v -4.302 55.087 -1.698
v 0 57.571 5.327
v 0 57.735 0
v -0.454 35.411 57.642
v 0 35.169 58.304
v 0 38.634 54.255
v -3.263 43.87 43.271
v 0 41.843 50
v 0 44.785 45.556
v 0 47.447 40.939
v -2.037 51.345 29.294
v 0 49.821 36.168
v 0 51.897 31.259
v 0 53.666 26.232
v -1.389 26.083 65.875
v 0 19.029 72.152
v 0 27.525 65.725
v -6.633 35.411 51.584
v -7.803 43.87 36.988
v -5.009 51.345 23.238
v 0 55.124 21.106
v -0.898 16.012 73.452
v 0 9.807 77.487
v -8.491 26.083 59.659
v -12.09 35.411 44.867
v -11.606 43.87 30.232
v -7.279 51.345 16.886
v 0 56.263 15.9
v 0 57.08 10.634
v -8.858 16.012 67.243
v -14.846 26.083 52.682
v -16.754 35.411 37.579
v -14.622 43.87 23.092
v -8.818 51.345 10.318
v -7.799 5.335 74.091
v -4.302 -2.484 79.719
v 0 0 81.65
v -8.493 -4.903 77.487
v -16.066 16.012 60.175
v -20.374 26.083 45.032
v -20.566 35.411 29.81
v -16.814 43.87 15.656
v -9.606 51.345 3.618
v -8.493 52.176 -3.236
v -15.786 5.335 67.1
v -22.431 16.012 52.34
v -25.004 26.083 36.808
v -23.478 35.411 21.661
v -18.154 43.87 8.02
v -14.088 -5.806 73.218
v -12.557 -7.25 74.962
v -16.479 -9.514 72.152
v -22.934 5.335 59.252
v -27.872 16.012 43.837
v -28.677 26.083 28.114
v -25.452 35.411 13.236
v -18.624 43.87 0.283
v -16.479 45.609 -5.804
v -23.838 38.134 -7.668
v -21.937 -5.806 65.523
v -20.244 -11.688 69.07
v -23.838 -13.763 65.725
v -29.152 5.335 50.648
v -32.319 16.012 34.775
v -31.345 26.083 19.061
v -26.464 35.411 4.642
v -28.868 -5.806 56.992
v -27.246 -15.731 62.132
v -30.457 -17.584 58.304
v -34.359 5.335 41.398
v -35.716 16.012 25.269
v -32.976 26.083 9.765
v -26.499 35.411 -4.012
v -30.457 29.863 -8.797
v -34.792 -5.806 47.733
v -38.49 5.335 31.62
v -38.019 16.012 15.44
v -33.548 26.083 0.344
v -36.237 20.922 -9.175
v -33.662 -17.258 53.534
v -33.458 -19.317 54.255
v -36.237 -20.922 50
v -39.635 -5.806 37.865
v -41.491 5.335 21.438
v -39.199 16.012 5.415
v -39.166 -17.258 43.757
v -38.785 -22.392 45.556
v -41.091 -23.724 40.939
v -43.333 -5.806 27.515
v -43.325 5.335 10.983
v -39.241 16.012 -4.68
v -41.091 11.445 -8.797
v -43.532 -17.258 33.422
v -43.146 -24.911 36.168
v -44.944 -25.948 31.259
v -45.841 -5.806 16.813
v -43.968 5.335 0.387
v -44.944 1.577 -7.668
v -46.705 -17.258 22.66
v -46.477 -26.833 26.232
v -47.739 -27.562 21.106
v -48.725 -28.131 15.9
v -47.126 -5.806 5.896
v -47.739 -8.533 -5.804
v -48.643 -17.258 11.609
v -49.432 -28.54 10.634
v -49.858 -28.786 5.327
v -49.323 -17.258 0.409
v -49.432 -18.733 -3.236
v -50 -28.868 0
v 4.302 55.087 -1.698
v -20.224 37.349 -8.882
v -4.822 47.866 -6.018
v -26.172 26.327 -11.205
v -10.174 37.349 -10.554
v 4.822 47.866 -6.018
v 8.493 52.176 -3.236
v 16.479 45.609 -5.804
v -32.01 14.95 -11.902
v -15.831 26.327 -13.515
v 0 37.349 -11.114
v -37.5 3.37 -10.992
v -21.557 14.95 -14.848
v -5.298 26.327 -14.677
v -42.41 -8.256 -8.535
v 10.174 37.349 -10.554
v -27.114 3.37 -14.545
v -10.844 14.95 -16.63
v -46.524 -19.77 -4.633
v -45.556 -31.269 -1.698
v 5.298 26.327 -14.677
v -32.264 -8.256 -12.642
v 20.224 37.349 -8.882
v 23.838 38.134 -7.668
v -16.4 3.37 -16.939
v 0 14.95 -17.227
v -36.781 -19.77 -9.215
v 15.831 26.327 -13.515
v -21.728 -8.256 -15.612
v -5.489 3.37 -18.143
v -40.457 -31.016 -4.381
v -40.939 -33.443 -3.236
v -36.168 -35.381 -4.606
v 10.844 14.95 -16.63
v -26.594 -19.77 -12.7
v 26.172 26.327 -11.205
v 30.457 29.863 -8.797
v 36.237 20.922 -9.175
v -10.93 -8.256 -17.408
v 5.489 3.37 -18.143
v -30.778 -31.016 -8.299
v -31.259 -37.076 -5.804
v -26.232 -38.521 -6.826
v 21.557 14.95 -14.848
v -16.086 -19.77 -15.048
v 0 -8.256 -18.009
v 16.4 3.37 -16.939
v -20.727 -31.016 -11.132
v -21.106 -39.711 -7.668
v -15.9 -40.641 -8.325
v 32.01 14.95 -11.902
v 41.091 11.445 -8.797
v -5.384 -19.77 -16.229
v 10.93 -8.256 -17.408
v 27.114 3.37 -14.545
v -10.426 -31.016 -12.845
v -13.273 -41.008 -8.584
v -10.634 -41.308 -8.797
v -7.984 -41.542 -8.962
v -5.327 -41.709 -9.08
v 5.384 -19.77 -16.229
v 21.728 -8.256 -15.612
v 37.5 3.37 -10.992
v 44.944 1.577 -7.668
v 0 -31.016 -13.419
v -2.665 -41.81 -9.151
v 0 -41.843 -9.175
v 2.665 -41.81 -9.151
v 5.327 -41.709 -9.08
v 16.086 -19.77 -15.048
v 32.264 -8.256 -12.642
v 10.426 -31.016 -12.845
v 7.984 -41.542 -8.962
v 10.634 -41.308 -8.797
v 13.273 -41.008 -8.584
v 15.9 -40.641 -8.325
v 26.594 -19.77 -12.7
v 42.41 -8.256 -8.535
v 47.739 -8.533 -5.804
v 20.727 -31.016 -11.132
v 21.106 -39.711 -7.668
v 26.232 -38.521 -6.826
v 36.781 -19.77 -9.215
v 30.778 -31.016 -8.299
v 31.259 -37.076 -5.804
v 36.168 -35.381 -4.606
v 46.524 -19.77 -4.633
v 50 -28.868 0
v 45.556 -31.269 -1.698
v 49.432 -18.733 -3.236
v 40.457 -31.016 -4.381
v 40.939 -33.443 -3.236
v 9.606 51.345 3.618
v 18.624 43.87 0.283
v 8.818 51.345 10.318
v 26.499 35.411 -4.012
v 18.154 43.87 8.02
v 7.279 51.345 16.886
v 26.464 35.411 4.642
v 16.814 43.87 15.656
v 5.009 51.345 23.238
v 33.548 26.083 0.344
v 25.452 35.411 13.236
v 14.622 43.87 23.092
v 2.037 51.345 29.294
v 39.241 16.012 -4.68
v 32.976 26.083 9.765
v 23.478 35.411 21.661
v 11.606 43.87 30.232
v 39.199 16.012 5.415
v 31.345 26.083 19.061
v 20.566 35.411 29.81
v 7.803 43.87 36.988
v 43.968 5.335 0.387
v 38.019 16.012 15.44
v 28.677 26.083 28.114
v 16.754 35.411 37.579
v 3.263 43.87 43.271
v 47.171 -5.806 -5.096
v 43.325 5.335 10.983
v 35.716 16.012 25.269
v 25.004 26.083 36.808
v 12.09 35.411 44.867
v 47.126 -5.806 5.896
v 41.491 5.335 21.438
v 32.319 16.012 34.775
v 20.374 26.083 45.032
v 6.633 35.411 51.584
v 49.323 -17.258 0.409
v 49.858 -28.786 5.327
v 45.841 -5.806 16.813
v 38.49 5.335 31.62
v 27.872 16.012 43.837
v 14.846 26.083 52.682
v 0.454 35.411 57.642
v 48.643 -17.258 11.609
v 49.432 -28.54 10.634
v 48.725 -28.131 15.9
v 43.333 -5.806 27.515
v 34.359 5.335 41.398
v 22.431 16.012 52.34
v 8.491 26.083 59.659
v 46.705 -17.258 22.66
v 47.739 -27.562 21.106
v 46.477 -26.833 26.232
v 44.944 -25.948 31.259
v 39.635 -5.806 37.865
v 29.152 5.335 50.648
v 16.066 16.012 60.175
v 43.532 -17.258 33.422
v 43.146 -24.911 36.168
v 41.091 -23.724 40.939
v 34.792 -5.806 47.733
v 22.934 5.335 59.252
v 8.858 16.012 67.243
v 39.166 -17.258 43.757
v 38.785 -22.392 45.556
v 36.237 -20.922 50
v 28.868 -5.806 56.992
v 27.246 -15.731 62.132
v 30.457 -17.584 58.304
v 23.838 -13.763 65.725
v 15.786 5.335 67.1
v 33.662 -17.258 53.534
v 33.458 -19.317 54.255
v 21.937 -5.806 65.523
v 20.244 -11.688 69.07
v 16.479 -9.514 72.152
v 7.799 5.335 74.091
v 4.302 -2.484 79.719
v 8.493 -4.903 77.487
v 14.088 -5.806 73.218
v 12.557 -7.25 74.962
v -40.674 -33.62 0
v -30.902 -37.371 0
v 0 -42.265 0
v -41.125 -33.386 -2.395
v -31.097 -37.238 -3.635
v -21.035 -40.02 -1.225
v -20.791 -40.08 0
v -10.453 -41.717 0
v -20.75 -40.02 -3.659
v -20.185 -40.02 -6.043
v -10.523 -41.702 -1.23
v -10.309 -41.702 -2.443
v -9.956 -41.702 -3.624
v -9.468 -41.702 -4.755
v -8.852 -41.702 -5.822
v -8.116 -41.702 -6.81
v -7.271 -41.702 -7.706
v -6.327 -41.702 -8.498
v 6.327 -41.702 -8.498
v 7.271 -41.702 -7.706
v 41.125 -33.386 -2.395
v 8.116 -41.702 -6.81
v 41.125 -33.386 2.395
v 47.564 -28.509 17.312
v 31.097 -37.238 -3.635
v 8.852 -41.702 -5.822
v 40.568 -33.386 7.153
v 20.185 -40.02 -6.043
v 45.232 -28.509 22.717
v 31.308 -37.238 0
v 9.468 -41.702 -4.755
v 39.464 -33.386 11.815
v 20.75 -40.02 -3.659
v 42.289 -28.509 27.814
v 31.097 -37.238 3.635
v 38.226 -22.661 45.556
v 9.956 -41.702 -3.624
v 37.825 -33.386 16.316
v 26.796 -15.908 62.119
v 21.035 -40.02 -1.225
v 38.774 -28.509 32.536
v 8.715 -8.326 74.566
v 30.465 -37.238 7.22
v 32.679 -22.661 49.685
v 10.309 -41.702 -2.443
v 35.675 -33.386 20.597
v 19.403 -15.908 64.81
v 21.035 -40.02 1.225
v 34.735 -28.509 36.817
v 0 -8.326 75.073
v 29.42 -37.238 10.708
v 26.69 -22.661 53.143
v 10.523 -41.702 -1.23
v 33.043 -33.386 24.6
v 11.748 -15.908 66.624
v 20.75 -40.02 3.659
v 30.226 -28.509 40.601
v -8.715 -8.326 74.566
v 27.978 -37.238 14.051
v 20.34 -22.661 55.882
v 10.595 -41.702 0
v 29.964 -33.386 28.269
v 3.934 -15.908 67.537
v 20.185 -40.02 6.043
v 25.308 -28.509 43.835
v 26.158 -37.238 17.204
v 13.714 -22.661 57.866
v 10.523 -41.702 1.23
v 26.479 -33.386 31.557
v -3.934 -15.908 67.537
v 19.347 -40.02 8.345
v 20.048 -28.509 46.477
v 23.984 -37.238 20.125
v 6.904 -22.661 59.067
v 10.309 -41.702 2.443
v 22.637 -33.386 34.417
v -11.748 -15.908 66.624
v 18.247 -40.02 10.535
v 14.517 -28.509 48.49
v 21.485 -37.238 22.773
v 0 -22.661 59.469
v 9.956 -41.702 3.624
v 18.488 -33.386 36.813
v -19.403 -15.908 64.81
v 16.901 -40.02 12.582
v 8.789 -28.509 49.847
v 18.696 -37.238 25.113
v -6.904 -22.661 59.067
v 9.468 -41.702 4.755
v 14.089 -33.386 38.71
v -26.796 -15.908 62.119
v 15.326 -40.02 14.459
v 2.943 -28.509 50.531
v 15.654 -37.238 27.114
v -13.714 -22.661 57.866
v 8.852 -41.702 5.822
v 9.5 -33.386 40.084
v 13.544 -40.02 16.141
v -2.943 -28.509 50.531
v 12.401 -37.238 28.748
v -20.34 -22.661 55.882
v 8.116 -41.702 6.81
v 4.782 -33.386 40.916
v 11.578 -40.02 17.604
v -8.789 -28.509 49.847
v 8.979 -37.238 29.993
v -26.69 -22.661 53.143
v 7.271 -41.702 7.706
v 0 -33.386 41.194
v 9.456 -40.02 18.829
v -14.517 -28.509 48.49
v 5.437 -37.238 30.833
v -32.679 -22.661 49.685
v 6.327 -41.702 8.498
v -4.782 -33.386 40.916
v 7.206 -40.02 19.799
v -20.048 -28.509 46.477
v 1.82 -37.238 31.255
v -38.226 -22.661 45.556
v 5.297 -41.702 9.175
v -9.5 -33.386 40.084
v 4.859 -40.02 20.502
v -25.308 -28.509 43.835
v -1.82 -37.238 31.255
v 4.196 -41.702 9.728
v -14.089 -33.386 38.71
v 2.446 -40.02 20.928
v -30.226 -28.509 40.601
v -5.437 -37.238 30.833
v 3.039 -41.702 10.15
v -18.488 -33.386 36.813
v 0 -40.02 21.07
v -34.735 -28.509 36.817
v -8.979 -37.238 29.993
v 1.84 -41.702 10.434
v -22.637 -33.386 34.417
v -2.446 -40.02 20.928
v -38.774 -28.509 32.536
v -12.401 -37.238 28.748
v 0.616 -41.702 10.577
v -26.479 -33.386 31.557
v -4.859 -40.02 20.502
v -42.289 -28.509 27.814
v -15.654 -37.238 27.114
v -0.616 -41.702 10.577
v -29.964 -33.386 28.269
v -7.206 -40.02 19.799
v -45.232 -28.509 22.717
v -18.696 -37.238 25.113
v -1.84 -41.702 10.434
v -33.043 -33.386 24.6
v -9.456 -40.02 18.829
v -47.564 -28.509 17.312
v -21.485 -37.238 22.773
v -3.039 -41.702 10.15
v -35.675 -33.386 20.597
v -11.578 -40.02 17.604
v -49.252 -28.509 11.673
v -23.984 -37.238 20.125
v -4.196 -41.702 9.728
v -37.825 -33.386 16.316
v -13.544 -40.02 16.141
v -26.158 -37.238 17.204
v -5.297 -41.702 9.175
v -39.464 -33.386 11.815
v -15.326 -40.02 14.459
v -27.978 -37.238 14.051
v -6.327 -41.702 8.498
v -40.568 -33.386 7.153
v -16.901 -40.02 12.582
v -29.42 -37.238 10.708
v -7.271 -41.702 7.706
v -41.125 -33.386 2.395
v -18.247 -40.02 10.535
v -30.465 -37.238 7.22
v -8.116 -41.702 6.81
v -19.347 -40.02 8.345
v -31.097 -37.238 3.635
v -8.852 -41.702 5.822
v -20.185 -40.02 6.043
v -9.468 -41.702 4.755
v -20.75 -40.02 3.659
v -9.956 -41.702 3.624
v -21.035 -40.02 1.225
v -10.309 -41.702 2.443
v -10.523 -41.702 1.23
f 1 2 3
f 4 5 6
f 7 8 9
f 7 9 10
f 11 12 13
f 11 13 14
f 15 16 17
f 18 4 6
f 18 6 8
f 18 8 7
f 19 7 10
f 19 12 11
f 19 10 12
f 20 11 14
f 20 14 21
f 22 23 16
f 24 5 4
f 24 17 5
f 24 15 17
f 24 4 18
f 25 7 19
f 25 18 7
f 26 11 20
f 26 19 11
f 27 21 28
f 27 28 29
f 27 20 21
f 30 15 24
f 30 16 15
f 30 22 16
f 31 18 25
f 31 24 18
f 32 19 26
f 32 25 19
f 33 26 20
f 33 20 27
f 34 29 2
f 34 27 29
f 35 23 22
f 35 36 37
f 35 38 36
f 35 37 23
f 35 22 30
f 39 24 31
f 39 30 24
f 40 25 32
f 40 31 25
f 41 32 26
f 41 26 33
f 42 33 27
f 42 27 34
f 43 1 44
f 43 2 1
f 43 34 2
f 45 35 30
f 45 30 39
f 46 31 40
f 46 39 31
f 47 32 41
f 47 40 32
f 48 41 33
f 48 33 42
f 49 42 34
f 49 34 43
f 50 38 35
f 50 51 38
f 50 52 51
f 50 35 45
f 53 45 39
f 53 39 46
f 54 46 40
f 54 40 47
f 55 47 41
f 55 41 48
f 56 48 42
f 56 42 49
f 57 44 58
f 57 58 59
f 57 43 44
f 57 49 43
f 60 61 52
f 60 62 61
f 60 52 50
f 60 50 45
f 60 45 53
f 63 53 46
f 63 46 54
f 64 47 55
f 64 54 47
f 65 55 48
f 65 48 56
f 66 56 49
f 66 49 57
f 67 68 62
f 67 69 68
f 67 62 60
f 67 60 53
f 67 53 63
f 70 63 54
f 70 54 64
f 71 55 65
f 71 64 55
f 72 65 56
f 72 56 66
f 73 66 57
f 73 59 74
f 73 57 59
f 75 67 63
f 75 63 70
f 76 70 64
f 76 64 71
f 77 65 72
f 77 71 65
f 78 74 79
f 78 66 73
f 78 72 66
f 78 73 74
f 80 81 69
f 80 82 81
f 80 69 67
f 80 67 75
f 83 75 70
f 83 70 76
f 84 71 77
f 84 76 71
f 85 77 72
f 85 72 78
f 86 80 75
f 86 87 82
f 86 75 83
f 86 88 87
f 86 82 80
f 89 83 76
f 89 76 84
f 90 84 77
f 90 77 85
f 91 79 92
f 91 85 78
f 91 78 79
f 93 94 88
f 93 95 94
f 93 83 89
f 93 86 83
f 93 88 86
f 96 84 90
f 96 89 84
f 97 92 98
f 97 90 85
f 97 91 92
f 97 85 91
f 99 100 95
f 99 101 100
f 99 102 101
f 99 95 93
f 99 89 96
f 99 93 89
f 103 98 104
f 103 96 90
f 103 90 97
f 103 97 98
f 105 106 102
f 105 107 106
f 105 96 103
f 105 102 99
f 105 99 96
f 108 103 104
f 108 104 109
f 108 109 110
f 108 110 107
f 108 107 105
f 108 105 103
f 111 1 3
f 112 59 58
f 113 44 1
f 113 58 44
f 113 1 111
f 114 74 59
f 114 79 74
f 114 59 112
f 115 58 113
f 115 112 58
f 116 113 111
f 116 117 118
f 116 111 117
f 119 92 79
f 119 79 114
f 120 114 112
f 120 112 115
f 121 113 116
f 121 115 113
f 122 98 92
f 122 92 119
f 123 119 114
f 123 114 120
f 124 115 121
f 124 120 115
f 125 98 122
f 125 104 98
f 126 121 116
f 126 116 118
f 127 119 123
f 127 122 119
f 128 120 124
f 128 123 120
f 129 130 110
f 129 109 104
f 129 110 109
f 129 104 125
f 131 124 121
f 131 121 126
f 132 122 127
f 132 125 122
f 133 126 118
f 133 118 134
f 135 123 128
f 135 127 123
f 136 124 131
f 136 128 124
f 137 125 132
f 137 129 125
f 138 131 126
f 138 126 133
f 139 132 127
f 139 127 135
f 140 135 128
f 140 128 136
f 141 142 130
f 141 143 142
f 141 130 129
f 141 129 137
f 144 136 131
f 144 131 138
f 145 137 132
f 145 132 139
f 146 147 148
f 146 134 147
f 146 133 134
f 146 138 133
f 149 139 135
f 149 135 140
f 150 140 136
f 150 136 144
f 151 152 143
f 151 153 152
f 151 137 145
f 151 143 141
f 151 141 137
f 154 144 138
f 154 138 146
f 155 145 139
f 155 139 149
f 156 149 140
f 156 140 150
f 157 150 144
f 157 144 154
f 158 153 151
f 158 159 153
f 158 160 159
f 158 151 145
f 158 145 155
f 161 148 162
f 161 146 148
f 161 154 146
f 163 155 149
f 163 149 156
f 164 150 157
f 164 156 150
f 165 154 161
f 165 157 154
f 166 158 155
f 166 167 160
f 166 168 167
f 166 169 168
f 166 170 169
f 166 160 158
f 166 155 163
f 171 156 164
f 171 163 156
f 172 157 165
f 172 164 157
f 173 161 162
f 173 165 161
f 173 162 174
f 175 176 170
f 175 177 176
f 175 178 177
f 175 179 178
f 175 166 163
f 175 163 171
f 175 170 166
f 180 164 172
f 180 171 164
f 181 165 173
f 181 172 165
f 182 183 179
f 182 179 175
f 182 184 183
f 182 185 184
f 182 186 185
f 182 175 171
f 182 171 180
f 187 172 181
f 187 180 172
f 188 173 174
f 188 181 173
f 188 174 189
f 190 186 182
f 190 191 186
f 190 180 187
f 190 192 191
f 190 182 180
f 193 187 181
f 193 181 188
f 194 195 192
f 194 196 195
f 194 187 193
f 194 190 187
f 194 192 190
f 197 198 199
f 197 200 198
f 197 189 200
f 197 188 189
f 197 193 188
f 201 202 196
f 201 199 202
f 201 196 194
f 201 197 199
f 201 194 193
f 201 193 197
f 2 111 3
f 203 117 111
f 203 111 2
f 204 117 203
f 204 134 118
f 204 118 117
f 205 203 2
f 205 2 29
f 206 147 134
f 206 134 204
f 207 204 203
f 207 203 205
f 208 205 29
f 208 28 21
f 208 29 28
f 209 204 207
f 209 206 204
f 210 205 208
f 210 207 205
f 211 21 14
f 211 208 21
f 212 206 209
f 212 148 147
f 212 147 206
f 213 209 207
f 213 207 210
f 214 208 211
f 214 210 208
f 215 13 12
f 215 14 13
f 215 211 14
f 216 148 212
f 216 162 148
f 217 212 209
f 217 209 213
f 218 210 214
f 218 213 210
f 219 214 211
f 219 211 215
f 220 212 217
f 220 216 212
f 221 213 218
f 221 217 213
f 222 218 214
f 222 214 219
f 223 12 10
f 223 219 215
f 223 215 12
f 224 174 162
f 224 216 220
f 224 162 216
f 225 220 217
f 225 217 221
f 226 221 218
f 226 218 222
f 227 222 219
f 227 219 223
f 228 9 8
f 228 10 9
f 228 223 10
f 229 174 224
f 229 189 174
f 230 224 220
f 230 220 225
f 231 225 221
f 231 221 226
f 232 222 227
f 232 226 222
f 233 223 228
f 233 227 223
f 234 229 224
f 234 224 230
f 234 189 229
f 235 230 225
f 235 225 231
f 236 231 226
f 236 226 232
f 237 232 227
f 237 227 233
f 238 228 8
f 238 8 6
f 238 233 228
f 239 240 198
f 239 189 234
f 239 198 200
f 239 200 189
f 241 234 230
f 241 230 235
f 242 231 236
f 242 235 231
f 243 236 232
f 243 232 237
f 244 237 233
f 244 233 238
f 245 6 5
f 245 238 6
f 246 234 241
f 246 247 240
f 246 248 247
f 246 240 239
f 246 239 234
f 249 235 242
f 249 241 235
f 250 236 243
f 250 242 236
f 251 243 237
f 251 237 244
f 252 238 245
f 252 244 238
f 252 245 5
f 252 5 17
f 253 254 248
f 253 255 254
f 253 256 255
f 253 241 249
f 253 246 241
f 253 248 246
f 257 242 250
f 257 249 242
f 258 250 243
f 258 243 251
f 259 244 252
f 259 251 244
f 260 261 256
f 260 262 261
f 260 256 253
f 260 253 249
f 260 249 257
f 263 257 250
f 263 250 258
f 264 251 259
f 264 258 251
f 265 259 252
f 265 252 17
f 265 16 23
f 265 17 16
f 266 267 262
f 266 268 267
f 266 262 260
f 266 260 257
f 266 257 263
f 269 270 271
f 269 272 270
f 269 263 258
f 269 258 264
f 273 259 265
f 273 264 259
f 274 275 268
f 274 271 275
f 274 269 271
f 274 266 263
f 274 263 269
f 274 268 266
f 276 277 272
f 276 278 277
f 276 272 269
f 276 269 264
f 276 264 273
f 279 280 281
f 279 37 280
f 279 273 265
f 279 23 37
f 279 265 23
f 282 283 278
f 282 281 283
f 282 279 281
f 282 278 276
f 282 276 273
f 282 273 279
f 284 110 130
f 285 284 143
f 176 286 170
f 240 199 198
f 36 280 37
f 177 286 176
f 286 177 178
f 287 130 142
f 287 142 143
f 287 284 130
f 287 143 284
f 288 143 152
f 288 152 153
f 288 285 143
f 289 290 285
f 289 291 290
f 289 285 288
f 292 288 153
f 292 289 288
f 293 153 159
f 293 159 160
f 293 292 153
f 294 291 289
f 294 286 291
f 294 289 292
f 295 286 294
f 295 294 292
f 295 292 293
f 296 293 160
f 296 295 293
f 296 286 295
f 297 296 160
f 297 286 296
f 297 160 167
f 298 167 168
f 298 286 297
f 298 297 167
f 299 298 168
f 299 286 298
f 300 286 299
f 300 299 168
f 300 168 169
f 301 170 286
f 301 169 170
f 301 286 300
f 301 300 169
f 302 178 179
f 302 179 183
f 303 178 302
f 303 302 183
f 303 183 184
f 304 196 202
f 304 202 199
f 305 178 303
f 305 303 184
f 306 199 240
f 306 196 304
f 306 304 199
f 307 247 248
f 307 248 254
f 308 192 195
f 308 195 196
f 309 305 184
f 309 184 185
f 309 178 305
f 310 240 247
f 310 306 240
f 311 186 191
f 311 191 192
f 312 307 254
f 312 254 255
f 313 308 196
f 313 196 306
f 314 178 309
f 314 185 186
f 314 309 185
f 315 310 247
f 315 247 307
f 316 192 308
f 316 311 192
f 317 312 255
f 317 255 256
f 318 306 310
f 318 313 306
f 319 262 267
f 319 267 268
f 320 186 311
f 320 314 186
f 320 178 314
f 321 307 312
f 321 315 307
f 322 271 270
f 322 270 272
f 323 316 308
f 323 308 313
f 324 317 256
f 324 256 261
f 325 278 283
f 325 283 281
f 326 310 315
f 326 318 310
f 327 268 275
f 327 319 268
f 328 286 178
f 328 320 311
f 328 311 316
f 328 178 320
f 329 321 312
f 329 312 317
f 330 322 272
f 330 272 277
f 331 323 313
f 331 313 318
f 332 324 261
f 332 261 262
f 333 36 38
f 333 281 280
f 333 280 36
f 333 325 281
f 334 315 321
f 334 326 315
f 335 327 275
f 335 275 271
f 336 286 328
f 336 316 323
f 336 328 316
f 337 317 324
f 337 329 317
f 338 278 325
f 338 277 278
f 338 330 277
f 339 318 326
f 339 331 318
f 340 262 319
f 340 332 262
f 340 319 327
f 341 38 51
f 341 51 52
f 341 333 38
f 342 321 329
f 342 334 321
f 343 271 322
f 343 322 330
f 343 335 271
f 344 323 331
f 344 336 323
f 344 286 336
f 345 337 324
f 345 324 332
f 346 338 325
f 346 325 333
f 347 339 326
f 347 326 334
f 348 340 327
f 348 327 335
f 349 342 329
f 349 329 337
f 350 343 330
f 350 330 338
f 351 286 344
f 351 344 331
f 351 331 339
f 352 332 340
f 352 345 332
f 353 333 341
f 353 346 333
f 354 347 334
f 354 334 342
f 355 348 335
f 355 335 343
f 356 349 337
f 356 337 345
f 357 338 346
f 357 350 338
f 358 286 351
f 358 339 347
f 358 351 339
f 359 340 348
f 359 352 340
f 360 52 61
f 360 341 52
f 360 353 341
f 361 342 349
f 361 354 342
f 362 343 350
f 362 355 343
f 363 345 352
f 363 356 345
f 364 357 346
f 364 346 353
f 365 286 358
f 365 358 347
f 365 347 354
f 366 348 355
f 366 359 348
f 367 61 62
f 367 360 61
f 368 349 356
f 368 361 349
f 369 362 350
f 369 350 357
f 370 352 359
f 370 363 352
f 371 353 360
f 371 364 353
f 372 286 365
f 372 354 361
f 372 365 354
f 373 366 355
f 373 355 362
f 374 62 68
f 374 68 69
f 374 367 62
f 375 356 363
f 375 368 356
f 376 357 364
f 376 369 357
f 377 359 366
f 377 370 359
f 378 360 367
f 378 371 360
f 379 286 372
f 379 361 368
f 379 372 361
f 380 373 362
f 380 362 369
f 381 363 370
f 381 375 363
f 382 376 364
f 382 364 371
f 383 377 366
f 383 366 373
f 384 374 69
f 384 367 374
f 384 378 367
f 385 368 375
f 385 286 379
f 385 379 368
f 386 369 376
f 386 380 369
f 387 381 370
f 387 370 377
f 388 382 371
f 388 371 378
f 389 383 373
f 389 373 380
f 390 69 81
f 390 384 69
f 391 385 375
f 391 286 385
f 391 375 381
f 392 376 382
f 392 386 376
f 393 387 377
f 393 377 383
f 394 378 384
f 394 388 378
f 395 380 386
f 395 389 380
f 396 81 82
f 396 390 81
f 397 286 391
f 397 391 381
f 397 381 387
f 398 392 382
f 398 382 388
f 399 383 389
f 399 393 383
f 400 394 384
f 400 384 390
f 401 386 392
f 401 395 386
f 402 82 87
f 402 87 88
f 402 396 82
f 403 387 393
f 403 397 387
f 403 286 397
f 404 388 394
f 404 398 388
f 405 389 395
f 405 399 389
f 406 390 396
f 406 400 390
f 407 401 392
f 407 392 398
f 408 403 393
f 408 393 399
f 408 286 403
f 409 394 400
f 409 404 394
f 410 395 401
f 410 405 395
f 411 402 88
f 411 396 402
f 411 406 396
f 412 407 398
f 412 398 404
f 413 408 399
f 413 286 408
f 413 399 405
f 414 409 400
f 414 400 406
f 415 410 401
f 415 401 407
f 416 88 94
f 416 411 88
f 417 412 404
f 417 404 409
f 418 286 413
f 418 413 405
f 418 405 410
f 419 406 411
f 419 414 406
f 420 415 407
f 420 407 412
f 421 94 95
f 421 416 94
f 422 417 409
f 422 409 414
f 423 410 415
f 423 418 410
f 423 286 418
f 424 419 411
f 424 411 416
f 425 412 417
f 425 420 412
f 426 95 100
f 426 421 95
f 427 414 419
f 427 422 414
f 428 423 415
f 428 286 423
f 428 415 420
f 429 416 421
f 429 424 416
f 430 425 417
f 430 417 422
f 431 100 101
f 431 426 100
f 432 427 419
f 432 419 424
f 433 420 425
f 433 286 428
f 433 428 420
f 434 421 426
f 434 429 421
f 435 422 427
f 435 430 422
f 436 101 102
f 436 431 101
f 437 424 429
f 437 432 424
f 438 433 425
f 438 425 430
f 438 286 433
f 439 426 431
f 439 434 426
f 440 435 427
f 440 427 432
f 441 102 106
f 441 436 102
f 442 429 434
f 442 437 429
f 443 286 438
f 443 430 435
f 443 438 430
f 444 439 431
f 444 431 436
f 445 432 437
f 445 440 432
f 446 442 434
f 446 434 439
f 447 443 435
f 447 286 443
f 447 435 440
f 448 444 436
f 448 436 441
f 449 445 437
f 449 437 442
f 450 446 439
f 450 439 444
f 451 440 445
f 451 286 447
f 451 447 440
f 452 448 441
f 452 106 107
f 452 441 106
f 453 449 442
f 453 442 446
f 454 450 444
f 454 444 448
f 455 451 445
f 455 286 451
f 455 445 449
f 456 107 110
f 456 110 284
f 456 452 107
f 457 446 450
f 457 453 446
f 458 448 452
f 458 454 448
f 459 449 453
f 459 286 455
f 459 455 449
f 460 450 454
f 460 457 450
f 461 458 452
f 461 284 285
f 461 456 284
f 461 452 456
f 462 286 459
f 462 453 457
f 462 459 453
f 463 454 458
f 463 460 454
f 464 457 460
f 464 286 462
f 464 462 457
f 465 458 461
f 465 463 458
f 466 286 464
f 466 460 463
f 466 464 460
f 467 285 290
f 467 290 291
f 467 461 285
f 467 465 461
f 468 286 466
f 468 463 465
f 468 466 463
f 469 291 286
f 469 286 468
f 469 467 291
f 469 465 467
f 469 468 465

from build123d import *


with BuildPart() as f2:
    # F0 (on Top) → F2 (revolve)
    with BuildSketch(Plane.XY):
        with BuildLine():
            Line((0, -42.264973081), (0, 157.735026919))
            ThreePointArc((0, 157.735026919), (-100, 57.735026919), (0, -42.264973081))
        make_face()
    revolve(axis=Axis((0, 57.735026919, 0), (0, -1, 0)))


with BuildPart() as f3_1:
    # F3: copy of F2
    add(f2.part.moved(Location((-50, -86.6025403784, 0))))


with BuildPart() as f4_1:
    # F4: copy of F2
    add(f2.part.moved(Location((50, -86.6025403784, 0))))


with BuildPart() as f5_1:
    # F5: copy of F2
    add(f2.part.moved(Location((0, -57.735026919, 81.6496580928))))


with BuildPart() as f2_1:
    add(f2.part)

    # F6: intersect F3_1, F4_1, F5_1
    add(f3_1.part, mode=Mode.INTERSECT)
    add(f4_1.part, mode=Mode.INTERSECT)
    add(f5_1.part, mode=Mode.INTERSECT)


solid = f2_1.part
